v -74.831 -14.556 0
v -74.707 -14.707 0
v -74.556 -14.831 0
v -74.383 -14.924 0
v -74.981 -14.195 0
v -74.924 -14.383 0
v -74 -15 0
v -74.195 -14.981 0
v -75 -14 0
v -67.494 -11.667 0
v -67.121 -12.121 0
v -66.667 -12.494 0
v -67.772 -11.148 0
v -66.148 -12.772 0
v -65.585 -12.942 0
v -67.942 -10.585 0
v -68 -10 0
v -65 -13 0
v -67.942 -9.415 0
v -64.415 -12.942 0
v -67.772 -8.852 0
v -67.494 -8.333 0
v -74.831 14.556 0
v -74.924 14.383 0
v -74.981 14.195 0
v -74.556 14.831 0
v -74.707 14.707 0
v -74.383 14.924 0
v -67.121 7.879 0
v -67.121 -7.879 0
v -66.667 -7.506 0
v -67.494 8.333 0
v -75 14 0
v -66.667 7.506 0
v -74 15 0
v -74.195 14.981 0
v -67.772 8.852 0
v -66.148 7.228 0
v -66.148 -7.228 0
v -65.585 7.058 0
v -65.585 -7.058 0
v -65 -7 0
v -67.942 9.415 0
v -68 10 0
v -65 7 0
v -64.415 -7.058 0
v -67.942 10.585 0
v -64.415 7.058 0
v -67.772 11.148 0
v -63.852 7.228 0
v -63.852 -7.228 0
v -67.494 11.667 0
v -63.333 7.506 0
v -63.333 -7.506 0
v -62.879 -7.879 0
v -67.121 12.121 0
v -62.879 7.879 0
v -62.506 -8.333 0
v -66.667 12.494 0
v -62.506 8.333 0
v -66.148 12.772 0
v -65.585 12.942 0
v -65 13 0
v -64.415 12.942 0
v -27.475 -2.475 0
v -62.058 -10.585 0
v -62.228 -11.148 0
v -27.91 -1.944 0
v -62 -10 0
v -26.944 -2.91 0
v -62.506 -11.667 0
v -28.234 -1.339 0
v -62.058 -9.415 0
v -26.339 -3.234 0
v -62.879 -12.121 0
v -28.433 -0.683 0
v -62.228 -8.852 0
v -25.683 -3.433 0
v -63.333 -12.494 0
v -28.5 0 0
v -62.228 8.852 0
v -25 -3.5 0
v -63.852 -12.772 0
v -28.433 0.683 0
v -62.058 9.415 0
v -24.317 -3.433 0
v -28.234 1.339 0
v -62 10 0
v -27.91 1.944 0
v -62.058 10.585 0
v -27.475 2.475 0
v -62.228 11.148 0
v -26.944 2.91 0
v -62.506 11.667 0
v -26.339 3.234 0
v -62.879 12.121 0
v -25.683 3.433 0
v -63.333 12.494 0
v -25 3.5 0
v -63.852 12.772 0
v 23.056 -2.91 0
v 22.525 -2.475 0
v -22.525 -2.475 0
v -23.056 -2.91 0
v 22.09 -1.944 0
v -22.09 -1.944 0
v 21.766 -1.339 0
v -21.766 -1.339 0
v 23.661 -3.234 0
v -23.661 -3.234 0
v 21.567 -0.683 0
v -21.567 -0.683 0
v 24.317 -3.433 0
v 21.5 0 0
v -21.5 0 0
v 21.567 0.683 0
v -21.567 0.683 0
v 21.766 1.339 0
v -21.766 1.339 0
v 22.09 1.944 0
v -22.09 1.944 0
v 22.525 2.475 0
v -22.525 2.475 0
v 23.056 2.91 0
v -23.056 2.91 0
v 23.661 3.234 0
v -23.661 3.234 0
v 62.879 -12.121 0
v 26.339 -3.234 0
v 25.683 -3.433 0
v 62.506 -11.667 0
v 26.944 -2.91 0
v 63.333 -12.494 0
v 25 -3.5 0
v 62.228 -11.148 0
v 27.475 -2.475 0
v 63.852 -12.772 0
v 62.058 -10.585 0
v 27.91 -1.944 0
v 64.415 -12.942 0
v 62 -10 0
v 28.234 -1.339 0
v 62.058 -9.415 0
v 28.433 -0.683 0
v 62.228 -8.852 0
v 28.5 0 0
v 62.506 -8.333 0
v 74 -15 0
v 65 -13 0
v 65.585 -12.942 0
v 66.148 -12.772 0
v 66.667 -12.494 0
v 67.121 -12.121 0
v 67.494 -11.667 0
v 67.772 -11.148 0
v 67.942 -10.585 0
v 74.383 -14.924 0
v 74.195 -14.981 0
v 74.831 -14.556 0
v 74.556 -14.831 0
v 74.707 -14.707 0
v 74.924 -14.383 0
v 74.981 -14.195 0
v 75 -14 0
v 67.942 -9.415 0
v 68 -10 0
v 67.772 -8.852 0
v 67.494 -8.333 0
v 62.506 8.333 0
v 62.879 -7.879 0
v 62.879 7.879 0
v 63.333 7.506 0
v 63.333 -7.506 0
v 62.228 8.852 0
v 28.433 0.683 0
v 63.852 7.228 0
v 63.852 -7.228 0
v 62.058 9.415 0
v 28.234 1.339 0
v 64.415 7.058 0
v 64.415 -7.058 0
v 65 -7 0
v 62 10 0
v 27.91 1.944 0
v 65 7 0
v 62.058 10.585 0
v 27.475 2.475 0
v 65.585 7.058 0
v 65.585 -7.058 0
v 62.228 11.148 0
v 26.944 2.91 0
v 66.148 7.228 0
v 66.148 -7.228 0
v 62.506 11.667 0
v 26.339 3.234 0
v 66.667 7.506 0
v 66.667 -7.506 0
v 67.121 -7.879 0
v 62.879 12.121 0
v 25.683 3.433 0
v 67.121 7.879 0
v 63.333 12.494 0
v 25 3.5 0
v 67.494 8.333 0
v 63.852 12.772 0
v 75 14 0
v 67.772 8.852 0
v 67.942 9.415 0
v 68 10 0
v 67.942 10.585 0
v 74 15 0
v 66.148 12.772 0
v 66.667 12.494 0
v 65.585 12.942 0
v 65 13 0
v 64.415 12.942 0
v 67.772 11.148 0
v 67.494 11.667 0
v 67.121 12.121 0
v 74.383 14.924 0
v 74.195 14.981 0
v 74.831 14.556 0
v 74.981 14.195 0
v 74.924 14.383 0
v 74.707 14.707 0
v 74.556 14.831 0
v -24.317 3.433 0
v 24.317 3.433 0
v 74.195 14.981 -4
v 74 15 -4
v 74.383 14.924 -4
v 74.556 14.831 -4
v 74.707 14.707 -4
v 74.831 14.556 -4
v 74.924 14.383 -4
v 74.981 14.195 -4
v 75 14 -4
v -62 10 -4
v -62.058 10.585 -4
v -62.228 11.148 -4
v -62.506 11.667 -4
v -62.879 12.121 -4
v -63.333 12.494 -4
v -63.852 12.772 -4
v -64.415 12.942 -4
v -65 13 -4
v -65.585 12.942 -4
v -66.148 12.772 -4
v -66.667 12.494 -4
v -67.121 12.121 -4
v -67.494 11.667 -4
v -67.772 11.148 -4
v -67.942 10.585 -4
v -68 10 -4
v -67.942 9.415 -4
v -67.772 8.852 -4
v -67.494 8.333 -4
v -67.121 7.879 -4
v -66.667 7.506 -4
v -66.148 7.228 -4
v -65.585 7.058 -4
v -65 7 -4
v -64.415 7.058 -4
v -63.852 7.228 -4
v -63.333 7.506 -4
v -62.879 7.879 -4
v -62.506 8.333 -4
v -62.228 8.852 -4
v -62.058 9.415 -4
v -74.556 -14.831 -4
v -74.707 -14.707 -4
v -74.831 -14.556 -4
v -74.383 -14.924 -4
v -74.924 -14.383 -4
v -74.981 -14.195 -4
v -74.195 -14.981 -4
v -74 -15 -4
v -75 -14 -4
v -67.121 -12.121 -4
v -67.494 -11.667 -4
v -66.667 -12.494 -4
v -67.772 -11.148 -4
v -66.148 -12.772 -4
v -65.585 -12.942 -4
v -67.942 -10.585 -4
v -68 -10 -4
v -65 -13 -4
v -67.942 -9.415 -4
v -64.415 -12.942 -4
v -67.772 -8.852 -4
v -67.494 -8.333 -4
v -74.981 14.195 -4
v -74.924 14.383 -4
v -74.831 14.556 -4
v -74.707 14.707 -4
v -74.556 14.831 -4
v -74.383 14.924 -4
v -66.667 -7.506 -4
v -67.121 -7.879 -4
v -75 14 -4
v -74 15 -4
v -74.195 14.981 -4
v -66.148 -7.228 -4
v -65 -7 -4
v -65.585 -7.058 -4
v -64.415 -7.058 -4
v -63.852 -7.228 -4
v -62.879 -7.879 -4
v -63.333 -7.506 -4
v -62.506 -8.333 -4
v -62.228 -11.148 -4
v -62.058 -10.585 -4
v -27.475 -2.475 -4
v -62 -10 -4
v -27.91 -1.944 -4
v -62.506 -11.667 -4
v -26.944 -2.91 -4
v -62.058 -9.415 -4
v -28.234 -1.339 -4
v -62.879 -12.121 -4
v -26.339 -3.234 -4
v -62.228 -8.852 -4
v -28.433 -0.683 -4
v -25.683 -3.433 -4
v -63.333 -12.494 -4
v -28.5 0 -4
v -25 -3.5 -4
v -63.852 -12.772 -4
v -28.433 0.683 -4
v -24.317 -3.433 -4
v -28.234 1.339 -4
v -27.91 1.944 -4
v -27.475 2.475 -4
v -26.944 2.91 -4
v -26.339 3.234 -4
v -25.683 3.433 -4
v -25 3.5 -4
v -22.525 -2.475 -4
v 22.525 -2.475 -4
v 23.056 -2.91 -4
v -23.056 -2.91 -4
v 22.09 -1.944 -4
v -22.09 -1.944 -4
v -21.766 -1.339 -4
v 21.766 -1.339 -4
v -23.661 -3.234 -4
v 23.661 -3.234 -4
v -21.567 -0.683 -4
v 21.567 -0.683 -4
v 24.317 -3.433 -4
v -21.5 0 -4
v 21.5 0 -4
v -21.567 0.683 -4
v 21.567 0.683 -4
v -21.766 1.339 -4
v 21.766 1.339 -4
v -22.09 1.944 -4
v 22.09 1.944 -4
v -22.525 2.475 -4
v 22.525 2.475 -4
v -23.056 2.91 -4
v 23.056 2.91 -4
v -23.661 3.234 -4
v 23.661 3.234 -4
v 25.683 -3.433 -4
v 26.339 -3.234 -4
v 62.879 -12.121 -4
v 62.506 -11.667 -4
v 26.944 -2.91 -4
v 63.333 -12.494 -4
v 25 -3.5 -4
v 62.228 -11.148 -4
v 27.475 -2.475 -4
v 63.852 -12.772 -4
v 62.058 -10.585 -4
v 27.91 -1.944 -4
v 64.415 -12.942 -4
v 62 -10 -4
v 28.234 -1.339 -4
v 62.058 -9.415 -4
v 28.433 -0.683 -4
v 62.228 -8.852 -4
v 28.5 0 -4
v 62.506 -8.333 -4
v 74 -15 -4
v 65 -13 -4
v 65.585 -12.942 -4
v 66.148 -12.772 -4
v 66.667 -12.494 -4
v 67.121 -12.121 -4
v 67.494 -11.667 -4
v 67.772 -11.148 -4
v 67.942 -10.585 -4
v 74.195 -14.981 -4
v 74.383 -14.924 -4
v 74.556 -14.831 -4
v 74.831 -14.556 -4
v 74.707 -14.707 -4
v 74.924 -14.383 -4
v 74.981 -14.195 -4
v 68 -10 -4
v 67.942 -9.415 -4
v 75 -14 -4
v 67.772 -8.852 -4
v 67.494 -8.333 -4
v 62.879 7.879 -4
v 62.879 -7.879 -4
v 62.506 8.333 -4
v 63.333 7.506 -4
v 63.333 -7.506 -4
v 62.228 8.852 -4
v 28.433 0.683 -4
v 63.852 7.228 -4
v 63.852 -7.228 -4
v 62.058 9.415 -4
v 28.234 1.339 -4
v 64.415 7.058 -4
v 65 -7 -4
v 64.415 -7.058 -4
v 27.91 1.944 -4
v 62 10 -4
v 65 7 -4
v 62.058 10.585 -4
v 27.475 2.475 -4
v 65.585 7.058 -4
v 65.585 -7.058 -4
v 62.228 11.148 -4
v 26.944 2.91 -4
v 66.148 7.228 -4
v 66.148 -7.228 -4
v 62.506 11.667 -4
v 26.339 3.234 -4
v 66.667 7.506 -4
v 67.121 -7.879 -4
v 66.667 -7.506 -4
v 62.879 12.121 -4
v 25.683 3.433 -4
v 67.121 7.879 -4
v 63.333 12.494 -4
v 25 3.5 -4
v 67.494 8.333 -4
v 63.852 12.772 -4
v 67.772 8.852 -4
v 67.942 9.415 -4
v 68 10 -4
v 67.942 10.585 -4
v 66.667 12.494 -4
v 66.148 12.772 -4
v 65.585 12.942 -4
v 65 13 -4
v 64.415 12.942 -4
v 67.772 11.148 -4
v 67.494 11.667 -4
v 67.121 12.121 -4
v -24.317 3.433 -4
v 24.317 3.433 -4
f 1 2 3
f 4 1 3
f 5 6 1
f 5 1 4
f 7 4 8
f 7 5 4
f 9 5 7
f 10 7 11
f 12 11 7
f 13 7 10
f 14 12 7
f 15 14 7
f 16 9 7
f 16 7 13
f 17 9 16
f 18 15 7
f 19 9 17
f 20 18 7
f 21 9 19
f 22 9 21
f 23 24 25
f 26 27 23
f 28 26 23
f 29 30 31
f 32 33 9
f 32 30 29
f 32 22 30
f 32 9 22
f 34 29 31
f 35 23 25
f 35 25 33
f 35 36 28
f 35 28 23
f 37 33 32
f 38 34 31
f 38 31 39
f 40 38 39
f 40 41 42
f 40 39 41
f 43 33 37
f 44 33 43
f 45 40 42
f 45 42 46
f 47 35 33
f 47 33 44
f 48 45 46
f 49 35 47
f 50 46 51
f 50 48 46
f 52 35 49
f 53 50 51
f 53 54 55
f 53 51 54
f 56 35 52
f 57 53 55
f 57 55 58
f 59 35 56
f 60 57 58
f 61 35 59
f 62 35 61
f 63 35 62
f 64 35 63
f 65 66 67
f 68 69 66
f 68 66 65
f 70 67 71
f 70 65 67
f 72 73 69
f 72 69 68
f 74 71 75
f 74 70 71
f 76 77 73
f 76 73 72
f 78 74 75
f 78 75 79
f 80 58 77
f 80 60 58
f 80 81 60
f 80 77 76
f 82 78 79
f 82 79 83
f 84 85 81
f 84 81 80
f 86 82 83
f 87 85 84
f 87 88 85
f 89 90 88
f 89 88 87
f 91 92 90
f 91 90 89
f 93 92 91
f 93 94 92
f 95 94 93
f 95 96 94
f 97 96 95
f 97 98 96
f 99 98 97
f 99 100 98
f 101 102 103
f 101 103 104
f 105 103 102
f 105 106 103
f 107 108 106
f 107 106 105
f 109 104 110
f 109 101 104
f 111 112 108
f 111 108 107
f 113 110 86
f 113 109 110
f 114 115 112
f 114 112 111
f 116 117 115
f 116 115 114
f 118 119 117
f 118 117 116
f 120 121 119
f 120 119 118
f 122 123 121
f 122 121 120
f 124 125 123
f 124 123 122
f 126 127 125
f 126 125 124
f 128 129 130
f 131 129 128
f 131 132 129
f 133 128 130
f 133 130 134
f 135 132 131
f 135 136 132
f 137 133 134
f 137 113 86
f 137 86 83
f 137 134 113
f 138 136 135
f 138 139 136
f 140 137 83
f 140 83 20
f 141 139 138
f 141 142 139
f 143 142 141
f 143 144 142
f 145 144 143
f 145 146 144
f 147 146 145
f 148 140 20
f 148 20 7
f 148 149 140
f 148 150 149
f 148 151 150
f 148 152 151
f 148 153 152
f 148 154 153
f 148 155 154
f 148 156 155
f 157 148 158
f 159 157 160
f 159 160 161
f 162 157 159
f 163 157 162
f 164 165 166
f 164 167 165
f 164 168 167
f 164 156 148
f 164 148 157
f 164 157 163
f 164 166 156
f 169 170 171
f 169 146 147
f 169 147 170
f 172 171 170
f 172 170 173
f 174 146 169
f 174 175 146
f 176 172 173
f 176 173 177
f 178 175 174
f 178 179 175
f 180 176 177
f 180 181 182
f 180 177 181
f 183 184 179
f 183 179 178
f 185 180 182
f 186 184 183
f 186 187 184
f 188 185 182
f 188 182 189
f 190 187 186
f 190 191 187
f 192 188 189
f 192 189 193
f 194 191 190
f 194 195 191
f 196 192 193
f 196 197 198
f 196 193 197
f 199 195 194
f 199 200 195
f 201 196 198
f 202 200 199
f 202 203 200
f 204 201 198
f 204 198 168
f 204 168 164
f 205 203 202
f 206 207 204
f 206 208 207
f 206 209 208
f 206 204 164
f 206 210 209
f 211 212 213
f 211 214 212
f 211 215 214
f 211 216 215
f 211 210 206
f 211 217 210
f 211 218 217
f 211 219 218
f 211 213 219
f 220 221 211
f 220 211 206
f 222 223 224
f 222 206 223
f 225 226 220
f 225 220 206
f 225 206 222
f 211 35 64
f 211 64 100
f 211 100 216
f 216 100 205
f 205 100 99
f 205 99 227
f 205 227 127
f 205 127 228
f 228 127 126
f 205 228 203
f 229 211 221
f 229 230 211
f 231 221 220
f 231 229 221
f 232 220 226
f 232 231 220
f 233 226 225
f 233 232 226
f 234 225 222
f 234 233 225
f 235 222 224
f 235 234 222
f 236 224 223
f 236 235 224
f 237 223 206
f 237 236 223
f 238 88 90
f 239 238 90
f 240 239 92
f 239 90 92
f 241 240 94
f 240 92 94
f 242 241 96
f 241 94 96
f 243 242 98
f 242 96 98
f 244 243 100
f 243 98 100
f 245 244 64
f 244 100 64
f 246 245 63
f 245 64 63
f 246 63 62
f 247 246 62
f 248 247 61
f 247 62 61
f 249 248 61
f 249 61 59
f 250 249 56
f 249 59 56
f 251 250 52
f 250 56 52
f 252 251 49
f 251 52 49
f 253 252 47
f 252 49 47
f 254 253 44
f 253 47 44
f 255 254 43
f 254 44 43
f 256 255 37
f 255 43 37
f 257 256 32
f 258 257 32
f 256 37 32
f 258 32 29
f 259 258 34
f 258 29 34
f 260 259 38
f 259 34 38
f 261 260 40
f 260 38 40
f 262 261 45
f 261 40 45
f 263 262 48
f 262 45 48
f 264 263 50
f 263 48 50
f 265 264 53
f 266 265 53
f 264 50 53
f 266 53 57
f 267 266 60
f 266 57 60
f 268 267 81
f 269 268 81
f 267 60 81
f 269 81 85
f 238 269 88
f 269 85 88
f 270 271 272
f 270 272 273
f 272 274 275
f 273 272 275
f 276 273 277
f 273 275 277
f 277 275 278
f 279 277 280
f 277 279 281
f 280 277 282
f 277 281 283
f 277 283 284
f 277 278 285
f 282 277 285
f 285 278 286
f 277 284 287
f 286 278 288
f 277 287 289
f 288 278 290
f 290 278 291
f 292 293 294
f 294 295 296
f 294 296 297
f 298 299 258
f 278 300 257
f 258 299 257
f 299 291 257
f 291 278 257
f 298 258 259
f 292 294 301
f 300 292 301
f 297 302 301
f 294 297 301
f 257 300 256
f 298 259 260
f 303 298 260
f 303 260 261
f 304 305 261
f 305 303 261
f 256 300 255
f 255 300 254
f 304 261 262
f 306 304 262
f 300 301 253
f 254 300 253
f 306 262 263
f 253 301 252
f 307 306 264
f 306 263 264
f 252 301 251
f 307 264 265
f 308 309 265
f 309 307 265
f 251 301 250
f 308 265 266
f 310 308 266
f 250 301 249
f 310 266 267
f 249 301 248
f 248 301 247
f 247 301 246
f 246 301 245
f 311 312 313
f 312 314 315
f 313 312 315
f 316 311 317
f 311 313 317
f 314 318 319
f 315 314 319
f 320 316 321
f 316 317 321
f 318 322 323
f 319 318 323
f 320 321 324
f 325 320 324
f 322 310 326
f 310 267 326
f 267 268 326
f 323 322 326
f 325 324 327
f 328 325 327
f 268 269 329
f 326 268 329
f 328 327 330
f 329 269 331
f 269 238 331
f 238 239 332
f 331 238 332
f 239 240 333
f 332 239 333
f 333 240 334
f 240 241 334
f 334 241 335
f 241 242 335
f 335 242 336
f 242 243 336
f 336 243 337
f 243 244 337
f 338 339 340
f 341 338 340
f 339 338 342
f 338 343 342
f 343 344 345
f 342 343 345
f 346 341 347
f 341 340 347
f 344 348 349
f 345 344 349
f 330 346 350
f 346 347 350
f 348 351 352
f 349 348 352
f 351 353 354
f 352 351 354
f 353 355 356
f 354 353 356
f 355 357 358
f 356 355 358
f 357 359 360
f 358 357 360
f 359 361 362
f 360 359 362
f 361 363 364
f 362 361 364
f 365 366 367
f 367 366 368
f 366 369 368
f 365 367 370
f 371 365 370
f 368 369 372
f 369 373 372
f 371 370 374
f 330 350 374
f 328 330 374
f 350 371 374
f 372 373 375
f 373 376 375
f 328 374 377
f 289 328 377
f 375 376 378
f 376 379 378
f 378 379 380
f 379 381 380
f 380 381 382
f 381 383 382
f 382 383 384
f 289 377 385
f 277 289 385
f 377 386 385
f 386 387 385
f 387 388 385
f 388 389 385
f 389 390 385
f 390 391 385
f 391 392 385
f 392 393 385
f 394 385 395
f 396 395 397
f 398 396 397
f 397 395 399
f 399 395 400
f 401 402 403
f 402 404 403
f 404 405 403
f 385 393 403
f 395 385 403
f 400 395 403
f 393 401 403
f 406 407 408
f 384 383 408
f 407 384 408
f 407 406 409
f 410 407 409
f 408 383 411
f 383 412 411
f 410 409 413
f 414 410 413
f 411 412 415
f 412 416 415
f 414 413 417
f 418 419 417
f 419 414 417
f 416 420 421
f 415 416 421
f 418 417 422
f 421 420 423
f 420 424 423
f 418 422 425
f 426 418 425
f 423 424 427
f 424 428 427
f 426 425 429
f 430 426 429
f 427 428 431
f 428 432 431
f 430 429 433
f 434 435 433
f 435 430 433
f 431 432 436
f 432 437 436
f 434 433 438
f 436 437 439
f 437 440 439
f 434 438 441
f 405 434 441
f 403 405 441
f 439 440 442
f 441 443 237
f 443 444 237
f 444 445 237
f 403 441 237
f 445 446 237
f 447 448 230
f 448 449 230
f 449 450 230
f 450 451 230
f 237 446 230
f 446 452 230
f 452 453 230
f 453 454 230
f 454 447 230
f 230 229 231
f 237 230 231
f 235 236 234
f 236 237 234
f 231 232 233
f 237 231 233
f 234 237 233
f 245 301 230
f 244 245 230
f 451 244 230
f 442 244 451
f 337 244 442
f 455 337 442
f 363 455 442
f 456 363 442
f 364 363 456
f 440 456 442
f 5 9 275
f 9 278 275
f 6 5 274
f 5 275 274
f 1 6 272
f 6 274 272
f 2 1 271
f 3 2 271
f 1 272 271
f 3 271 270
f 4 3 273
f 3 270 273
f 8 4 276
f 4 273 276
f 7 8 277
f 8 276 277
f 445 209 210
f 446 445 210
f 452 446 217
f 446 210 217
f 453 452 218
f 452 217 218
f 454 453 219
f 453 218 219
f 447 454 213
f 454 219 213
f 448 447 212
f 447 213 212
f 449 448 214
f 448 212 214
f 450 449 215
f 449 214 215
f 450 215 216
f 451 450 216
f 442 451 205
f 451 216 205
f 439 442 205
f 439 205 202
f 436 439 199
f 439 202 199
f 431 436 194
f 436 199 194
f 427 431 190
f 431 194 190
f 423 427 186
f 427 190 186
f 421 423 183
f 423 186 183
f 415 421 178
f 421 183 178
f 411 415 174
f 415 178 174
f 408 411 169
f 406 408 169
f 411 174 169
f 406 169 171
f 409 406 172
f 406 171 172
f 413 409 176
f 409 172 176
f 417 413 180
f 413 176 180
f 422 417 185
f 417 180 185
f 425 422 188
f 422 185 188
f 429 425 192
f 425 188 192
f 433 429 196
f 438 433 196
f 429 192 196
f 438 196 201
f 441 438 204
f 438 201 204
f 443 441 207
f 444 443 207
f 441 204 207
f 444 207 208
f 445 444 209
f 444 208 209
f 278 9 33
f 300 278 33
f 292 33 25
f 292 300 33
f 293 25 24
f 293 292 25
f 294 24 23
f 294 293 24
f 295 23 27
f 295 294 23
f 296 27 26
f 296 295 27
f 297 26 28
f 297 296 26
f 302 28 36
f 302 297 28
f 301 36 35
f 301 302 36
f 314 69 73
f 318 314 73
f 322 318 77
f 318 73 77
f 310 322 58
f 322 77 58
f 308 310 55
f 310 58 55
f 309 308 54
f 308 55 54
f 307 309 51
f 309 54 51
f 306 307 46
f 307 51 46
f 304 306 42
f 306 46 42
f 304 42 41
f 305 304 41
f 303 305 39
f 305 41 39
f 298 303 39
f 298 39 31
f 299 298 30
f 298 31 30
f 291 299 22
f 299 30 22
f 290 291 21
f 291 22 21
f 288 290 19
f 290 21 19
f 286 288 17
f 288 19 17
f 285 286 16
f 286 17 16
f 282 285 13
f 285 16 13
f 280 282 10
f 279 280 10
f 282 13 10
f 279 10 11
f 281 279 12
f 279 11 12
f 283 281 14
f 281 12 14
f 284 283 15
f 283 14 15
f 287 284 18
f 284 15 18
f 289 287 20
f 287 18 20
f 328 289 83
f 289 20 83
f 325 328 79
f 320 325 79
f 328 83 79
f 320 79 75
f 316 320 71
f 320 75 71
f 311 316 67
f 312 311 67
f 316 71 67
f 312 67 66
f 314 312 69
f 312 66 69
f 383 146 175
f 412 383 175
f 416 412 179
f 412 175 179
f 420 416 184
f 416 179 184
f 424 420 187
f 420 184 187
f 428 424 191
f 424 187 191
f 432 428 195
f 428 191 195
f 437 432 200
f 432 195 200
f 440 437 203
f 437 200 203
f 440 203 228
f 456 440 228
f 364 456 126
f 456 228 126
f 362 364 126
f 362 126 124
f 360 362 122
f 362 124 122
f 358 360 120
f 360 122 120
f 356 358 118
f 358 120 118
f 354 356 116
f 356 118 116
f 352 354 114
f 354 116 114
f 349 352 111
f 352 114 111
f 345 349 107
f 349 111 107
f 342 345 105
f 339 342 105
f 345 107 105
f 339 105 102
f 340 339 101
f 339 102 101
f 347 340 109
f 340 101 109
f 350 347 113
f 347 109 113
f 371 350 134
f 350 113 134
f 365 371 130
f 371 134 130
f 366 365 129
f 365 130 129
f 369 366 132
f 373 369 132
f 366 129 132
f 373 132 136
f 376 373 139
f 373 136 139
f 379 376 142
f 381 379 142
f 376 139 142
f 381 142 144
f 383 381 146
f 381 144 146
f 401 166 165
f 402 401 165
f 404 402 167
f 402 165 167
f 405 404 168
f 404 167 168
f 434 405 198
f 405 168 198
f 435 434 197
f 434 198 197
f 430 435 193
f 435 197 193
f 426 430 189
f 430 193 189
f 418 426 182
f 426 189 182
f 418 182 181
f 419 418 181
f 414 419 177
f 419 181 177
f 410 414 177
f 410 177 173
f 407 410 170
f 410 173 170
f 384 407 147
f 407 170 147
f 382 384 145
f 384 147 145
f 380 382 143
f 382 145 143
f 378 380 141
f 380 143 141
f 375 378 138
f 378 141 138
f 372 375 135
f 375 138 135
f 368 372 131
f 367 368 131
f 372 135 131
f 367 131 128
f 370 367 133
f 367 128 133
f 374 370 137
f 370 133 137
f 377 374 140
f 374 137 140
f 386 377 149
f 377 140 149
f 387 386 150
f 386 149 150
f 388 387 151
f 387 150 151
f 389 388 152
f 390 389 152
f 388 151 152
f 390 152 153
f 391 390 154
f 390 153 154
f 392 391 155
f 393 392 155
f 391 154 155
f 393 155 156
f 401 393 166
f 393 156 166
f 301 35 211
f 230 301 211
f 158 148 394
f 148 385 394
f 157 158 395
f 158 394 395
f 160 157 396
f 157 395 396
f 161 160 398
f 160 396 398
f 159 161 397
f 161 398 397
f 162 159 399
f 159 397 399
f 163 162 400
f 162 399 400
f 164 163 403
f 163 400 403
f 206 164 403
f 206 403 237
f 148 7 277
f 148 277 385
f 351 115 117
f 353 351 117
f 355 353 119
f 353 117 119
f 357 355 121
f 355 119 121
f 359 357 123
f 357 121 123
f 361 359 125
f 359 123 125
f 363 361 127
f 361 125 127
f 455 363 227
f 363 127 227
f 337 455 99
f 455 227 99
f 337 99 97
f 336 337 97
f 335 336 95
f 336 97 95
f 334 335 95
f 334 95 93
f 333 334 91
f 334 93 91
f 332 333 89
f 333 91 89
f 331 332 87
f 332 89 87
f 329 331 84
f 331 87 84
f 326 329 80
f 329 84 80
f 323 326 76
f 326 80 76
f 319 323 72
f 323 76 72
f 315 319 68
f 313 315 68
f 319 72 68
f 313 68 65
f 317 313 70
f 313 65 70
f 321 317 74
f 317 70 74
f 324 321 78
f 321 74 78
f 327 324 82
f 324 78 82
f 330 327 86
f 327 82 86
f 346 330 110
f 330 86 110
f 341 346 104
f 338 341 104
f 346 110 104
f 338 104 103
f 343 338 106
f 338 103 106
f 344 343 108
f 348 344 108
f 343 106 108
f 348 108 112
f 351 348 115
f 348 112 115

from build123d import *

# Parameters (mm, degrees)
SKETCH1_W          = 150
SKETCH1_H          = 30
SKETCH1_R          = 3.5
SKETCH1_R_2        = 3
BASE_FLANGE1_DEPTH = 4
FILLET1_R          = 1


# Sheet-metal steps are written as plain solids
with BuildPart() as part:
    # Sketch1 → Base-Flange1 (new body)
    with BuildSketch(Plane.XY):
        Rectangle(SKETCH1_W, SKETCH1_H)
        with Locations((25, 0)):
            Circle(SKETCH1_R, mode=Mode.SUBTRACT)
        with Locations((-25, 0)):
            Circle(SKETCH1_R, mode=Mode.SUBTRACT)
        with Locations((65, -10)):
            Circle(SKETCH1_R_2, mode=Mode.SUBTRACT)
        with Locations((65, 10)):
            Circle(SKETCH1_R_2, mode=Mode.SUBTRACT)
        with Locations((-65, -10)):
            Circle(SKETCH1_R_2, mode=Mode.SUBTRACT)
        with Locations((-65, 10)):
            Circle(SKETCH1_R_2, mode=Mode.SUBTRACT)
    extrude(amount=-BASE_FLANGE1_DEPTH)

    # Fillet1
    fillet1_edges = [part.edges().sort_by_distance(p)[0] for p in [
        (-75, 15, -2),
        (75, 15, -2),
        (75, -15, -2),
        (-75, -15, -2),
    ]]
    fillet(fillet1_edges, radius=FILLET1_R)


solid = part.part
